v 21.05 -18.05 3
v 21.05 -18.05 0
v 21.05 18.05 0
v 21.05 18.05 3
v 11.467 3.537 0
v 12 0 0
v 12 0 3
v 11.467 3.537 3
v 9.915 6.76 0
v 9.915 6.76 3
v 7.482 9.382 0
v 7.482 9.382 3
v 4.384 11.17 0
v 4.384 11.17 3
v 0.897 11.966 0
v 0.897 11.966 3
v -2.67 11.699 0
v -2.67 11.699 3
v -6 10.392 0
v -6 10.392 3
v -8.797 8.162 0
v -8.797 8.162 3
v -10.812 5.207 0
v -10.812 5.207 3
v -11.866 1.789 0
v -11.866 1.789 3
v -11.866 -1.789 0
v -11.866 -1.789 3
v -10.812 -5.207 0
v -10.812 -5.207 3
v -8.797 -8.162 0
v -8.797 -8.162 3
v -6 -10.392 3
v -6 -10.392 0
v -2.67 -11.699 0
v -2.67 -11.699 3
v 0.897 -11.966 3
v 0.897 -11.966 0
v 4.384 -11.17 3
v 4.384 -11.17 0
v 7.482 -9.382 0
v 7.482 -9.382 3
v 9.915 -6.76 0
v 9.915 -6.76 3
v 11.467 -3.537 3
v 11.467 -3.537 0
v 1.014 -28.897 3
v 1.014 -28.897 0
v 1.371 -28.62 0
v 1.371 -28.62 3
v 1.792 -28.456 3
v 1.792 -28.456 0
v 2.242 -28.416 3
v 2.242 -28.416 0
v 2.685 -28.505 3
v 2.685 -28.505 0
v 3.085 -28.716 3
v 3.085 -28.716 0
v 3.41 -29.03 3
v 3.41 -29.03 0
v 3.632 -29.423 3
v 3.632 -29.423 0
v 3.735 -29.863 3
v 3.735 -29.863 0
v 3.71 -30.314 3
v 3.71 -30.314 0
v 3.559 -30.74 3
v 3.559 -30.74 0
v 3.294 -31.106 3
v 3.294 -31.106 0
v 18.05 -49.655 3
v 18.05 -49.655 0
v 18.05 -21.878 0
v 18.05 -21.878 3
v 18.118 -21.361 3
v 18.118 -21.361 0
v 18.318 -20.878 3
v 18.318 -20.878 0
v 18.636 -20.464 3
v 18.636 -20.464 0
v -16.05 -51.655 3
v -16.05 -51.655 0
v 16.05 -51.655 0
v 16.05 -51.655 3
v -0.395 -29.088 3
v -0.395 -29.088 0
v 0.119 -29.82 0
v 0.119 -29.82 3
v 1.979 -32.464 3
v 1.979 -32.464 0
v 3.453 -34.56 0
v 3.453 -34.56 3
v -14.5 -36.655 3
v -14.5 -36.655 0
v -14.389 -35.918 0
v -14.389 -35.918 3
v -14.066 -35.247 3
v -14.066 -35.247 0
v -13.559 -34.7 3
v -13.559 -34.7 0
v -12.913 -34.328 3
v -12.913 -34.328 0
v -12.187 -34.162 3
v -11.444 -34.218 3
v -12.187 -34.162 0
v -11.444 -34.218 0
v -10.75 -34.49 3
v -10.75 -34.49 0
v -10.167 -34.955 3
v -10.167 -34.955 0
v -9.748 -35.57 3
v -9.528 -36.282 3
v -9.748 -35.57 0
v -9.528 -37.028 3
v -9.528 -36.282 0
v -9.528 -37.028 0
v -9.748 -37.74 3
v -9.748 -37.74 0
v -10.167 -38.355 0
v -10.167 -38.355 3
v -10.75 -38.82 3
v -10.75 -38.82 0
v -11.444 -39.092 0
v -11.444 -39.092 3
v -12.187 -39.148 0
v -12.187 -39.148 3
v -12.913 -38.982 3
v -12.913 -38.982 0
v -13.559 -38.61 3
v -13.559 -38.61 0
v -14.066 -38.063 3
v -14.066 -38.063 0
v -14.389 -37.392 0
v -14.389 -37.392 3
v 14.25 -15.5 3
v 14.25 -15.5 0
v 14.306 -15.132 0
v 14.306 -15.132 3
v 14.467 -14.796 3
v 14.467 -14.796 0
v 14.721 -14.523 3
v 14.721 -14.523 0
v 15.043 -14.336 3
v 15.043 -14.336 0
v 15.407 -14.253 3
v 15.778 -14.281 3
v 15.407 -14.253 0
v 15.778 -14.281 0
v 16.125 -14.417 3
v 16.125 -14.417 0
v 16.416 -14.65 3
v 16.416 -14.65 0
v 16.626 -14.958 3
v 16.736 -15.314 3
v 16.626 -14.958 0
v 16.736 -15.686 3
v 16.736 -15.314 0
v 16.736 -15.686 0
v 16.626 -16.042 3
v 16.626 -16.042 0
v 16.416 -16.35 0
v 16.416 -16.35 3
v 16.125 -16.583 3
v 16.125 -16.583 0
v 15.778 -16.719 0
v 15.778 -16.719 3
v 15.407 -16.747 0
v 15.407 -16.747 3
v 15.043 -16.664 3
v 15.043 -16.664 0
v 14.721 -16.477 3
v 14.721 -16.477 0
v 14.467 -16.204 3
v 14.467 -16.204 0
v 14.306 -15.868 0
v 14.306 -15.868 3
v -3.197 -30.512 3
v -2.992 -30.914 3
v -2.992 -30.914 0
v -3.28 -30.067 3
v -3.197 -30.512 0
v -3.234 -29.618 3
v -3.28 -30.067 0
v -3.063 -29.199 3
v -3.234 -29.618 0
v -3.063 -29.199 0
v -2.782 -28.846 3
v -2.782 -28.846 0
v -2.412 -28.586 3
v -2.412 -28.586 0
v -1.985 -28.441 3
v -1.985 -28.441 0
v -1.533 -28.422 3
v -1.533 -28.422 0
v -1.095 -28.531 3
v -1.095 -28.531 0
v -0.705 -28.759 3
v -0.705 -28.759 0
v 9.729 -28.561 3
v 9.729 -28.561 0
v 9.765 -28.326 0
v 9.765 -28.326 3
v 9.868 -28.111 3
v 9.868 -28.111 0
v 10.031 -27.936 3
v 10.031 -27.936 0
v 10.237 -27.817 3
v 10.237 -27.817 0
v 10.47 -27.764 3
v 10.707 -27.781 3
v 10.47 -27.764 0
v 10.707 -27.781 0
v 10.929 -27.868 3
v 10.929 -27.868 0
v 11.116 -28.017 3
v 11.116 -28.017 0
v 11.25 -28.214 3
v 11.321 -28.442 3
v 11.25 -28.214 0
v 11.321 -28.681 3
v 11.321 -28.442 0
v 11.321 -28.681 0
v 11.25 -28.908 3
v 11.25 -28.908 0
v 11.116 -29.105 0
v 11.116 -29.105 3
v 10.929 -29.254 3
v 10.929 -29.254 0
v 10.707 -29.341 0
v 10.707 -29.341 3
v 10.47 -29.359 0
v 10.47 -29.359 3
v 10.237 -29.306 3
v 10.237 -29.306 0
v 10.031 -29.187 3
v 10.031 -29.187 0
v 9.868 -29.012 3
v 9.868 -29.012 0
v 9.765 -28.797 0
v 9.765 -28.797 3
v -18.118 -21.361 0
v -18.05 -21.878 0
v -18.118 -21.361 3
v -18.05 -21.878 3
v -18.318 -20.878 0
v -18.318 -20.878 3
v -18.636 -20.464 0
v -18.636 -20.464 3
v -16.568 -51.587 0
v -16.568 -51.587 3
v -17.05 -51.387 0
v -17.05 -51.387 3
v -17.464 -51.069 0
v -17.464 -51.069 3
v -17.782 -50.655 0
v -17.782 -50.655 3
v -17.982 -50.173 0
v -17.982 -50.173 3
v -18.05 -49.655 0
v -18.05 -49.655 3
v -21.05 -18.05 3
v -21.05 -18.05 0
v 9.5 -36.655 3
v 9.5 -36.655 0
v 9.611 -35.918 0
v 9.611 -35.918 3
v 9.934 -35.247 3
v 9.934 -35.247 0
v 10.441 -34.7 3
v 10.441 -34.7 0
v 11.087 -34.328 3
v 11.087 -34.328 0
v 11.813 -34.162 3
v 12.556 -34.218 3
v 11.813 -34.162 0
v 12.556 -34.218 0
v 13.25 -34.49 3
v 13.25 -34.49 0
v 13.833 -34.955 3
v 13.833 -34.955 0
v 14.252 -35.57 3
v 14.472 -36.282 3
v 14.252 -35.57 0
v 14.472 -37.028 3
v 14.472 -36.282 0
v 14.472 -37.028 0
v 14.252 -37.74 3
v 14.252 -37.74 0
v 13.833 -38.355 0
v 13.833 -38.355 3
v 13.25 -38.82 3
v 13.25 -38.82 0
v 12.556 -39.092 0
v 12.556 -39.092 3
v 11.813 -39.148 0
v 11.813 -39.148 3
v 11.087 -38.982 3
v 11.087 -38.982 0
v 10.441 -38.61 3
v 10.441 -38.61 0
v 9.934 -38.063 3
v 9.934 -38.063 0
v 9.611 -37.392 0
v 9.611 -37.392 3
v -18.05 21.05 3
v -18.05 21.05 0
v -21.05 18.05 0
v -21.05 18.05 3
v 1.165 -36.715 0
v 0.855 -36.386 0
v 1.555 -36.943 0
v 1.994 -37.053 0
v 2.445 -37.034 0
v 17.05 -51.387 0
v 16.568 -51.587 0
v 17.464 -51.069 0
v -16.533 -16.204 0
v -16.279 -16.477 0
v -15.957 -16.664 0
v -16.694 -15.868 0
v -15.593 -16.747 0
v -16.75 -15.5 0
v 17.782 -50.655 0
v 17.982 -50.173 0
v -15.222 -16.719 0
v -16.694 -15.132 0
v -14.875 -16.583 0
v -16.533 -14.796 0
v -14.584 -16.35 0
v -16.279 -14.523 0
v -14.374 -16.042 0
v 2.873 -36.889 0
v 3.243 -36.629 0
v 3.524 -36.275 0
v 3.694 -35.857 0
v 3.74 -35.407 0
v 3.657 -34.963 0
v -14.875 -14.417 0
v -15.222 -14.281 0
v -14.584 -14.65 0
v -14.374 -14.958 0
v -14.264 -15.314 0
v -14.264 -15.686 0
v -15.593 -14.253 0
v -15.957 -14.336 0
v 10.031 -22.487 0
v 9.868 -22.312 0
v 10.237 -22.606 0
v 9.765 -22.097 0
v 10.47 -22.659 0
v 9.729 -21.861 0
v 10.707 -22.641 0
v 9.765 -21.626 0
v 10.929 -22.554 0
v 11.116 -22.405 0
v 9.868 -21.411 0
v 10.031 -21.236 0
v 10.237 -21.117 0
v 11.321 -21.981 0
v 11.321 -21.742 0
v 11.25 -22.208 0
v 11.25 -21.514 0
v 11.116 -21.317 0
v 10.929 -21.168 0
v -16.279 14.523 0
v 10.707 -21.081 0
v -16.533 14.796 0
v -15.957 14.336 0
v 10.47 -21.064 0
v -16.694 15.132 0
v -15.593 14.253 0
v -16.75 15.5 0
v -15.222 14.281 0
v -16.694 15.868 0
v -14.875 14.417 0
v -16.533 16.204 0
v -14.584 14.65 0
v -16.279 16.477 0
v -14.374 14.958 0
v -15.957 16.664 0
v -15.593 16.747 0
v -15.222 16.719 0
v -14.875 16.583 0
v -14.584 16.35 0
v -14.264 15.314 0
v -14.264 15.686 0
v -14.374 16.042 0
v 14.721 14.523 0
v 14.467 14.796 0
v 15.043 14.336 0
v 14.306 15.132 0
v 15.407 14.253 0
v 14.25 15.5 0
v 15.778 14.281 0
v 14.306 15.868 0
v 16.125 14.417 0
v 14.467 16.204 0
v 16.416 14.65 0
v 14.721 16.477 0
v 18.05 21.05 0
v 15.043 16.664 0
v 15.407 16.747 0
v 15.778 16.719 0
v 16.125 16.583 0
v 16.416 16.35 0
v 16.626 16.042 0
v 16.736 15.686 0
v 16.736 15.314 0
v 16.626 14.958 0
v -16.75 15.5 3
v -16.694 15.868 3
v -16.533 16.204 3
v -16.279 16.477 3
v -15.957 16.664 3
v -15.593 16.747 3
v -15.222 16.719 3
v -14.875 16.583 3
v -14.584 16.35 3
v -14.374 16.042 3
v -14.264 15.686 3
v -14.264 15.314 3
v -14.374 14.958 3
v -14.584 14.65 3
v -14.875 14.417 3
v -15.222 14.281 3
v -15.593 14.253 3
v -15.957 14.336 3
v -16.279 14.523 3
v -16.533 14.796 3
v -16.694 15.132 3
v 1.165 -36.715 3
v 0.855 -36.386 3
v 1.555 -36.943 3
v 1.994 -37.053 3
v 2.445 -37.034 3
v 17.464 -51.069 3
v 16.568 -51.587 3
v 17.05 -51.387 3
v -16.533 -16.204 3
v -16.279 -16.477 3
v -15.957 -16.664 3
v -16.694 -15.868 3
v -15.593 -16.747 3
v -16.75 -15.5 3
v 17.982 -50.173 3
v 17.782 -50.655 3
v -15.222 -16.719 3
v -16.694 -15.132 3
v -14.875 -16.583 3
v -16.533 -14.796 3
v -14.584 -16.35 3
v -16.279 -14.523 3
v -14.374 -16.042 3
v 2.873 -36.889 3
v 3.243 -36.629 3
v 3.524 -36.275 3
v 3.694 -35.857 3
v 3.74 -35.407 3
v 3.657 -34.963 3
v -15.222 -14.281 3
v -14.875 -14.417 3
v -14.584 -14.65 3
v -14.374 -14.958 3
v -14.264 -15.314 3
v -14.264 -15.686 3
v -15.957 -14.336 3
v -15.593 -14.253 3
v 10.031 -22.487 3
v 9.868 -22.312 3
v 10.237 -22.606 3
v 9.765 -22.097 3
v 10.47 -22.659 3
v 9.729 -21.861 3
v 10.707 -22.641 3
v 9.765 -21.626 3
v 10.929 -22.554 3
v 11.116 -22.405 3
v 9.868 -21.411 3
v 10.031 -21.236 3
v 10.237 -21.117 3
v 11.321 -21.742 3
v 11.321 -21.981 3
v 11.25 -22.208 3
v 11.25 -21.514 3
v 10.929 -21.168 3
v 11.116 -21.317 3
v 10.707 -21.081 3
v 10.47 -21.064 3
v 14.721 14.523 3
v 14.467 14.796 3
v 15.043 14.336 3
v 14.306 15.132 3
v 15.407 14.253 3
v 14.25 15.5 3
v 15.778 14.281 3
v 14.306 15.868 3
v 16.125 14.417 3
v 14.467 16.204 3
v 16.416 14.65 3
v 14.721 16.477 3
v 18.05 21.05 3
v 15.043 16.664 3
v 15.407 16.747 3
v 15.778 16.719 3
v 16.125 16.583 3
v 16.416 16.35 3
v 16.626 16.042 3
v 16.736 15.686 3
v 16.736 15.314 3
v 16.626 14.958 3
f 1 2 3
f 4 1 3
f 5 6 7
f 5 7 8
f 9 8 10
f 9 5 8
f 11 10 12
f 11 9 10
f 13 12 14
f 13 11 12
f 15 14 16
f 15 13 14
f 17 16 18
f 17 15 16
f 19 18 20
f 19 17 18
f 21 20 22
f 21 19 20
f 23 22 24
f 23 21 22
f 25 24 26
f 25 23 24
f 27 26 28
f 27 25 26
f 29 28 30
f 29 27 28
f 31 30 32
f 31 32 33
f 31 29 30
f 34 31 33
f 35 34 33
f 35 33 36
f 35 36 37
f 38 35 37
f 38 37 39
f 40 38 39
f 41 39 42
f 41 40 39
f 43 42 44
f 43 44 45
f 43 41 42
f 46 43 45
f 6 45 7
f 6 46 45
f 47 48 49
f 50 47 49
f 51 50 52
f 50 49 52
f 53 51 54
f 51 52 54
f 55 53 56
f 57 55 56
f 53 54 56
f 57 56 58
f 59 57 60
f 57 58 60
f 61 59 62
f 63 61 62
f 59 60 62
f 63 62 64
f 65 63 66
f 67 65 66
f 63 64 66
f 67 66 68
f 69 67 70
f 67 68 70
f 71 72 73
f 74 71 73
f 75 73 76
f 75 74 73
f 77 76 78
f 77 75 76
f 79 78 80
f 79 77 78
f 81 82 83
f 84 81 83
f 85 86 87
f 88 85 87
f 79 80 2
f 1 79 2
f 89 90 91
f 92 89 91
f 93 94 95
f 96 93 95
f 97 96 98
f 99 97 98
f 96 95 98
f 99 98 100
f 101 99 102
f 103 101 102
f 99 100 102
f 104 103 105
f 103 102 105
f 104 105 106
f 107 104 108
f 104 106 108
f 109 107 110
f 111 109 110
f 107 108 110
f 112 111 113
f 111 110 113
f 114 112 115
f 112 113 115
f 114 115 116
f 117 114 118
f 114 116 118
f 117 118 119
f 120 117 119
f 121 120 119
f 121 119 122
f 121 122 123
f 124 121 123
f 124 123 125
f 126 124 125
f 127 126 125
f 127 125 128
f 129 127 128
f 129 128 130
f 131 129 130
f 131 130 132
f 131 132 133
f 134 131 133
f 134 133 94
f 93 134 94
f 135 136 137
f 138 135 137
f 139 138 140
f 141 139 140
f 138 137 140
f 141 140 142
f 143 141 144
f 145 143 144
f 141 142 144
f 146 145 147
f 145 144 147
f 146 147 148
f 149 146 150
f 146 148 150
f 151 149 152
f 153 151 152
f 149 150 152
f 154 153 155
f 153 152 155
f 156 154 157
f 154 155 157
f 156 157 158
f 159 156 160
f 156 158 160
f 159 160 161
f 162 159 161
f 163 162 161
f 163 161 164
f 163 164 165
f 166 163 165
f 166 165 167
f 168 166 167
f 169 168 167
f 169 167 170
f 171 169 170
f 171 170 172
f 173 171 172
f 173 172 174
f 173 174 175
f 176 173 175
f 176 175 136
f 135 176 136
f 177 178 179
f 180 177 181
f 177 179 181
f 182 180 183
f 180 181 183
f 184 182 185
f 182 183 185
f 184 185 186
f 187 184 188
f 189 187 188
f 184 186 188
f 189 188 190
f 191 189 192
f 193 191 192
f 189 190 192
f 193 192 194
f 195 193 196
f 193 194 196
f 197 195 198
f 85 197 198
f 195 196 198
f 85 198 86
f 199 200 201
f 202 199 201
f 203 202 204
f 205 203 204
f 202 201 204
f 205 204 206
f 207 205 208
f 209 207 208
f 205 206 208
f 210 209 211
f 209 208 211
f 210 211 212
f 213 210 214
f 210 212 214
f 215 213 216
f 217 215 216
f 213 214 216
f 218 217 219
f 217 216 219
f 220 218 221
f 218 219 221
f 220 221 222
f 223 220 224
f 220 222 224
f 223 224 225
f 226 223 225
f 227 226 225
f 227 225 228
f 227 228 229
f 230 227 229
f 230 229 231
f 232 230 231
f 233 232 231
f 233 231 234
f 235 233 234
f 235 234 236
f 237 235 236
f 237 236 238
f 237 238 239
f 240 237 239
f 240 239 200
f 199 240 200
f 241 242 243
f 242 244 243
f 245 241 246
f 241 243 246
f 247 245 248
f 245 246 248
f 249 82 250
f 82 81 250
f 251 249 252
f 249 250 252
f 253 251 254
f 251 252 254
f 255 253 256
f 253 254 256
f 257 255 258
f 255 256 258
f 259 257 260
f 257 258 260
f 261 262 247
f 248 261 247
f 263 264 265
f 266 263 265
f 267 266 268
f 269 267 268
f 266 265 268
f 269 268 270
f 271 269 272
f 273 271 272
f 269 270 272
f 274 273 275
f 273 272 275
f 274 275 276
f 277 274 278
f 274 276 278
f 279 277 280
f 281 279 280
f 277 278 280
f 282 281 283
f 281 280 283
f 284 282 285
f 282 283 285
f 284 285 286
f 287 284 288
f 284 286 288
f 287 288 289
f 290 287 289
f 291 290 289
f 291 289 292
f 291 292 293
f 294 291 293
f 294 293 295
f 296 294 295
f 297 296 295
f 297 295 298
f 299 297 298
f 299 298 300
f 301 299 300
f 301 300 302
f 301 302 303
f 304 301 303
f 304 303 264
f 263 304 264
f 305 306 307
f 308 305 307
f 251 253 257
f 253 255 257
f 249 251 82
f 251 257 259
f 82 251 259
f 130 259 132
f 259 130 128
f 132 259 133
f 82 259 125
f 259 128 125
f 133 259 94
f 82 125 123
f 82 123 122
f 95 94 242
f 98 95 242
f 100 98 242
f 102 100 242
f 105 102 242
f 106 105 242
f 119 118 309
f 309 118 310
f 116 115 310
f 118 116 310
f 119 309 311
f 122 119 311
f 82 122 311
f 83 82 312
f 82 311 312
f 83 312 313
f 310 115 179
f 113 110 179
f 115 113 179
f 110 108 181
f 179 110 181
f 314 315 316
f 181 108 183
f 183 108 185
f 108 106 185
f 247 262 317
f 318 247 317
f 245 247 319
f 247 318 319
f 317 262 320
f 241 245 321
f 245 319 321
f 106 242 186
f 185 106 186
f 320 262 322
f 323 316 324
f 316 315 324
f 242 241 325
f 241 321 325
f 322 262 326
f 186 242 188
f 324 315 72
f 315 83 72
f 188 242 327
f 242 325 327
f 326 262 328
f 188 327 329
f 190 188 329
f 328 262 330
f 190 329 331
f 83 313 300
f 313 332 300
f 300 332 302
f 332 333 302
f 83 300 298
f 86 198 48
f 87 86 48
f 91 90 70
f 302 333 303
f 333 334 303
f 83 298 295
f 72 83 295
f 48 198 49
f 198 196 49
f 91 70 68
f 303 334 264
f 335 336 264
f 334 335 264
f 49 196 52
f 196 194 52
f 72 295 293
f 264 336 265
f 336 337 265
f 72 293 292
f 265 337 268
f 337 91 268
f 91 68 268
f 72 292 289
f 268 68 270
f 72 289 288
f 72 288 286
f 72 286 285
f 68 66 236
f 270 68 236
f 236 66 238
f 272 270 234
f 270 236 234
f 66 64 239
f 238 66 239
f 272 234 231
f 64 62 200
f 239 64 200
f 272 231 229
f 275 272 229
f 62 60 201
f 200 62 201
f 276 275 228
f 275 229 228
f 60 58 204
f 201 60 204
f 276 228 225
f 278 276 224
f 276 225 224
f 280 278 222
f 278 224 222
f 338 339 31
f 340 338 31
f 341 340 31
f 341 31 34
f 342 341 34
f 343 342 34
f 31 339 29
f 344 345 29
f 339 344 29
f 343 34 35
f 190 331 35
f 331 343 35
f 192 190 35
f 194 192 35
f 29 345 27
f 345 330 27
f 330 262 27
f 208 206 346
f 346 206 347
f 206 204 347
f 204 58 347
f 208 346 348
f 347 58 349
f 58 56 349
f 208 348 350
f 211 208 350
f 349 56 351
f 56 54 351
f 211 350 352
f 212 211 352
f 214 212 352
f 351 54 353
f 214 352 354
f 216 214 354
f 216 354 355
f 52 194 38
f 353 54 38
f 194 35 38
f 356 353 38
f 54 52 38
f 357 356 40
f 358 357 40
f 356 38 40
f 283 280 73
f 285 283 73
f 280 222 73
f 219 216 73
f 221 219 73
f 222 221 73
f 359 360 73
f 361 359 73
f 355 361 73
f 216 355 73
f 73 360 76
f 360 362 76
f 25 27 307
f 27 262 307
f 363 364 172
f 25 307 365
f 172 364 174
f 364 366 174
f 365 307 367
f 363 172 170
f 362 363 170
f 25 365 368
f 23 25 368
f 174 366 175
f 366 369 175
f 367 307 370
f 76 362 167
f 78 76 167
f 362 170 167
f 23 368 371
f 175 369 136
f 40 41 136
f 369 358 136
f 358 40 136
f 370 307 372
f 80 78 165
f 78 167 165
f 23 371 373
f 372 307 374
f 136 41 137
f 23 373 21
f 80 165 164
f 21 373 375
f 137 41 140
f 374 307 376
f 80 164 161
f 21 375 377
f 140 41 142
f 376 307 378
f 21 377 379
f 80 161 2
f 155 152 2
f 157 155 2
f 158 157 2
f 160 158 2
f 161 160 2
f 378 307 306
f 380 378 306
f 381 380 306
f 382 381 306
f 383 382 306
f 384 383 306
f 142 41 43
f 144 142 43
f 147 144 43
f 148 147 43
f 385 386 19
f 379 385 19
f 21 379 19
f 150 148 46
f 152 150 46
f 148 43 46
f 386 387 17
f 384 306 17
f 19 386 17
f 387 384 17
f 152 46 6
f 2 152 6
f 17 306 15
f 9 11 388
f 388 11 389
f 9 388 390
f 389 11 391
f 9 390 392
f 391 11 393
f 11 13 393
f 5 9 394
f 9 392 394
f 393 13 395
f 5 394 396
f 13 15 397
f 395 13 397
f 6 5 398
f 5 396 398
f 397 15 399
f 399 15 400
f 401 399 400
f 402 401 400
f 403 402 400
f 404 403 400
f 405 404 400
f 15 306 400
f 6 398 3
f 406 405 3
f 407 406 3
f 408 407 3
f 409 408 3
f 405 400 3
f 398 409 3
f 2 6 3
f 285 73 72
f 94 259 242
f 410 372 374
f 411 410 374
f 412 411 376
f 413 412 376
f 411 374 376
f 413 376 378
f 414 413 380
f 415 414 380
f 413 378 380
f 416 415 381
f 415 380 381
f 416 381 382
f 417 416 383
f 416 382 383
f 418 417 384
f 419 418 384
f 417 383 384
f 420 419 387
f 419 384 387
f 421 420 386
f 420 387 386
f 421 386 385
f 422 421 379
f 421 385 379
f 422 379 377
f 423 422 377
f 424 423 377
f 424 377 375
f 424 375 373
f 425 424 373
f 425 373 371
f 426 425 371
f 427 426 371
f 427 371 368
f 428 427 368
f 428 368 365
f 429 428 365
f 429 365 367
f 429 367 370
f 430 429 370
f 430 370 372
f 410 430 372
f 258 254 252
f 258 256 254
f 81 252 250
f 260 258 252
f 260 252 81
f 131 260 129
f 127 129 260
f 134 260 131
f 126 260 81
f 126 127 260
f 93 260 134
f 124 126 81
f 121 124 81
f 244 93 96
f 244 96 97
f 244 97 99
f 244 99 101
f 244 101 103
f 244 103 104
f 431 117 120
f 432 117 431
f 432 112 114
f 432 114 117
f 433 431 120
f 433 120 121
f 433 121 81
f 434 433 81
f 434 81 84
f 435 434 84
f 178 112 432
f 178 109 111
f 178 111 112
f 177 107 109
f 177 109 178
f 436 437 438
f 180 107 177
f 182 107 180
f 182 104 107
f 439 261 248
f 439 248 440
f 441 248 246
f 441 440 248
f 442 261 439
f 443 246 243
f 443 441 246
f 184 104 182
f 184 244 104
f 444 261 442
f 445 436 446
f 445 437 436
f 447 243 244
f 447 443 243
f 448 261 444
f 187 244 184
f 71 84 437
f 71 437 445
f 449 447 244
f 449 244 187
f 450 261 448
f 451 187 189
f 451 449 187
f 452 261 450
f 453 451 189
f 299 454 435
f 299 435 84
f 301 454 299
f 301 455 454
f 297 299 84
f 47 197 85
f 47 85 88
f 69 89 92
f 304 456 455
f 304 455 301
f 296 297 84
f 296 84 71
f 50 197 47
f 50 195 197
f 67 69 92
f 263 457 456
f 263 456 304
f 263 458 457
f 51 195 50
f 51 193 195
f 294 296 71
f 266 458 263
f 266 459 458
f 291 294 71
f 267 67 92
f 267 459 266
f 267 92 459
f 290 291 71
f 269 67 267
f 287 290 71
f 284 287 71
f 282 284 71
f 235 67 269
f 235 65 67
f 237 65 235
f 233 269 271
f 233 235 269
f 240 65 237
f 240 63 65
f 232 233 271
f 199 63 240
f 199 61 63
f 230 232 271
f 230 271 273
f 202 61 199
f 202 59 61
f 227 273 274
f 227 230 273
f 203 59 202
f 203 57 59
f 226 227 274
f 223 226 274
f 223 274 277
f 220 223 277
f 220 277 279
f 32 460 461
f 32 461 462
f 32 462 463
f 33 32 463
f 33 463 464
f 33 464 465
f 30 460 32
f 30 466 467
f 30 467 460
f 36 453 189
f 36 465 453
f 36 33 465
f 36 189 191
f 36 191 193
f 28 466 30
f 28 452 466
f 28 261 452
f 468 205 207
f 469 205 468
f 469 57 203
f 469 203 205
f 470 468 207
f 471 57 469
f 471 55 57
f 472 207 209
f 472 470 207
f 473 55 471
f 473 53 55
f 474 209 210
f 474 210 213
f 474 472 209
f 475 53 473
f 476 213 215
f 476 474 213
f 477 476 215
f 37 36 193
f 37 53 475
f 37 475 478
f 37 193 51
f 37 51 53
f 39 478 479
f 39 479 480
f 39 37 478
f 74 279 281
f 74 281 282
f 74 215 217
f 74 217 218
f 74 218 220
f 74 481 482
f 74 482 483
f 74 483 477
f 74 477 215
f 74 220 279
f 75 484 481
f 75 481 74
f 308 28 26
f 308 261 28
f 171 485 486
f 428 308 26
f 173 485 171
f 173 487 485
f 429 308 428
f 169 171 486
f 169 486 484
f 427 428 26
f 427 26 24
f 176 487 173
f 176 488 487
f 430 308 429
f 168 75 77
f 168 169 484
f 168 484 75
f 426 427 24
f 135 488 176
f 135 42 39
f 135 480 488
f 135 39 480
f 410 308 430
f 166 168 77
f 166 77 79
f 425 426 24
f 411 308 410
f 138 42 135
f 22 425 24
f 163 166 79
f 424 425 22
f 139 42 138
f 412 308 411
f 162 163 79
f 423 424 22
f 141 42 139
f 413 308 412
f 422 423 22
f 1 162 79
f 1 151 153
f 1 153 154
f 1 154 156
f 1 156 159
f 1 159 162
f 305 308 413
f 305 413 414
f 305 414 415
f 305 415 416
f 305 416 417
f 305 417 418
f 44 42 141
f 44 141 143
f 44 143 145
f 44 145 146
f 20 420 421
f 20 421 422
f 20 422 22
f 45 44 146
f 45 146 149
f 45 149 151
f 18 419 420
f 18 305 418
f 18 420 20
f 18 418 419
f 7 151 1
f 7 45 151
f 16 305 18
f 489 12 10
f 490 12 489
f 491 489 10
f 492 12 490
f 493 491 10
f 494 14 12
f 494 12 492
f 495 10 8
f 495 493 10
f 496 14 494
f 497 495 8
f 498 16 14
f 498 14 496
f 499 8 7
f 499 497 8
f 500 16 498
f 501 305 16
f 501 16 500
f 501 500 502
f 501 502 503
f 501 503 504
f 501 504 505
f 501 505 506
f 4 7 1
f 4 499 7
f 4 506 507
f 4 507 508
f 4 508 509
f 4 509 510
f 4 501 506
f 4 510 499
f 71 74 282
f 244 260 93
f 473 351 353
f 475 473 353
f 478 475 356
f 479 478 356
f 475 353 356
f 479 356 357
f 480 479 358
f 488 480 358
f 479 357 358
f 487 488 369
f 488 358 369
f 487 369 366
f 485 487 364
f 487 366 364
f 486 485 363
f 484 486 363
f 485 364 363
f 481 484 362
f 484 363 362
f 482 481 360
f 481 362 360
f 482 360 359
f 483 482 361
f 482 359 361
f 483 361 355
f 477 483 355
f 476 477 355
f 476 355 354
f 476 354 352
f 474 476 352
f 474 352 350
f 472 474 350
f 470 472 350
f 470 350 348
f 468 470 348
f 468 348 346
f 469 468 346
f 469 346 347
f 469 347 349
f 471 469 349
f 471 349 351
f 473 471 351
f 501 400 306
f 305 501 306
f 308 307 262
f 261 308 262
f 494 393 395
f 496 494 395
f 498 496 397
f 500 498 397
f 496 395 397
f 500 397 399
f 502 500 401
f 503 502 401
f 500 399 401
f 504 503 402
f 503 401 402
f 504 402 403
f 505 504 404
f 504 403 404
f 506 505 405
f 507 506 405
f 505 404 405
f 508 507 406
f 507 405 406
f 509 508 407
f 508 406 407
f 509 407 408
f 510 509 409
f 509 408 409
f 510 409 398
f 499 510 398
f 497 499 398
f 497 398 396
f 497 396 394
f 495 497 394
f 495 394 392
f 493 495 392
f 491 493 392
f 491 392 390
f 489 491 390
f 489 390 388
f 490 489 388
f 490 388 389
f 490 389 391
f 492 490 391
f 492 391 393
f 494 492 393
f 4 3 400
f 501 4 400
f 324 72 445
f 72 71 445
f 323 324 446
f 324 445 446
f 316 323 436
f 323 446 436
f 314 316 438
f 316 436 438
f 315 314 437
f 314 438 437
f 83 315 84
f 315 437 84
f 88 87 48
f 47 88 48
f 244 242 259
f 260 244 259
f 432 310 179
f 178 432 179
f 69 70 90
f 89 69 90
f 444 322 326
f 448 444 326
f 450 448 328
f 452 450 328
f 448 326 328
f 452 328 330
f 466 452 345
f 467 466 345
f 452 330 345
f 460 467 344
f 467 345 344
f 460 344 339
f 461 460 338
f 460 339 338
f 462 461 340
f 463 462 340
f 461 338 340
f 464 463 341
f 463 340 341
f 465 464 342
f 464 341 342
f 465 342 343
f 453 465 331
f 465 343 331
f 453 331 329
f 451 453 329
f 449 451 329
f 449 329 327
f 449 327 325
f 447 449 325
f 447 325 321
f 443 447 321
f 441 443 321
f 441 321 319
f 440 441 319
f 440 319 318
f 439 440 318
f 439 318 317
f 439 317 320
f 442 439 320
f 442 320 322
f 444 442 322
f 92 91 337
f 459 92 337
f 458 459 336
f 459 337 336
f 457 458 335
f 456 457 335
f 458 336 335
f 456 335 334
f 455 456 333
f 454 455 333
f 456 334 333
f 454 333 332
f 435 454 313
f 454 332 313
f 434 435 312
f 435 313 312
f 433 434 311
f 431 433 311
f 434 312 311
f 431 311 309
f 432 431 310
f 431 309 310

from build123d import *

# Parameters (mm, degrees)
SKETCH1_R                   = 12
BOSS_EXTRUDE1_DEPTH         = 3
TAP_DRILL_FOR_M3_TAP1_D     = 2.5
TAP_DRILL_FOR_M3_TAP1_DEPTH = 5
TAP_DRILL_FOR_M3_TAP1_TIP   = 0.751075774
TAP_DRILL_FOR_M6_TAP1_D     = 5
TAP_DRILL_FOR_M6_TAP1_DEPTH = 5
TAP_DRILL_FOR_M6_TAP1_TIP   = 1.502151548
FILLET1_R                   = 2
TAP_DRILL_FOR_M2_TAP1_D     = 1.6
TAP_DRILL_FOR_M2_TAP1_DEPTH = 5
TAP_DRILL_FOR_M2_TAP1_TIP   = 0.480688495
CUT_EXTRUDE1_DEPTH          = 10


with BuildPart() as part:
    # Sketch1 → Boss-Extrude1 (new body)
    with BuildSketch(Plane.XY):
        Polygon((18.05, -51.655), (18.05, -21.05), (21.05, -18.05), (21.05, 18.05), (18.05, 21.05), (-18.05, 21.05), (-21.05, 18.05), (-21.05, -18.05), (-18.05, -21.05), (-18.05, -51.655), align=None)
        Circle(SKETCH1_R, mode=Mode.SUBTRACT)
    extrude(amount=BOSS_EXTRUDE1_DEPTH)

    # Tap Drill for M3 Tap1
    with Locations(Plane.XY.offset(3)):
        with Locations((-15.5, 15.5), (15.5, 15.5), (-15.5, -15.5), (15.5, -15.5)):
            Hole(TAP_DRILL_FOR_M3_TAP1_D / 2, depth=TAP_DRILL_FOR_M3_TAP1_DEPTH)
            with Locations((0, 0, -(TAP_DRILL_FOR_M3_TAP1_DEPTH + TAP_DRILL_FOR_M3_TAP1_TIP / 2))):  # 118° drill point
                Cone(0, TAP_DRILL_FOR_M3_TAP1_D / 2, TAP_DRILL_FOR_M3_TAP1_TIP, mode=Mode.SUBTRACT)

    # Tap Drill for M6 Tap1
    with Locations(Plane.XY.offset(3)):
        with Locations((-12, -36.655), (12, -36.655)):
            Hole(TAP_DRILL_FOR_M6_TAP1_D / 2, depth=TAP_DRILL_FOR_M6_TAP1_DEPTH)
            with Locations((0, 0, -(TAP_DRILL_FOR_M6_TAP1_DEPTH + TAP_DRILL_FOR_M6_TAP1_TIP / 2))):  # 118° drill point
                Cone(0, TAP_DRILL_FOR_M6_TAP1_D / 2, TAP_DRILL_FOR_M6_TAP1_TIP, mode=Mode.SUBTRACT)

    # Fillet1
    fillet1_edges = [part.edges().sort_by_distance(p)[0] for p in [
        (18.05, -21.05, 1.5),
        (18.05, -51.655, 1.5),
        (-18.05, -51.655, 1.5),
        (-18.05, -21.05, 1.5),
    ]]
    fillet(fillet1_edges, radius=FILLET1_R)

    # Tap Drill for M2 Tap1
    with Locations(Plane.XY.offset(3)):
        with Locations((10.52945603, -21.86131015), (10.52945603, -28.56131015)):
            Hole(TAP_DRILL_FOR_M2_TAP1_D / 2, depth=TAP_DRILL_FOR_M2_TAP1_DEPTH)
            with Locations((0, 0, -(TAP_DRILL_FOR_M2_TAP1_DEPTH + TAP_DRILL_FOR_M2_TAP1_TIP / 2))):  # 118° drill point
                Cone(0, TAP_DRILL_FOR_M2_TAP1_D / 2, TAP_DRILL_FOR_M2_TAP1_TIP, mode=Mode.SUBTRACT)

    # Sketch8 → Cut-Extrude1 (cut)
    with BuildSketch(Plane(origin=(0, 0, 0), x_dir=(-1, 0, 0), z_dir=(0, 0, -1))):
        with BuildLine():
            Line((-0.855282685, -36.386266358), (2.992061815, -30.914487513))
            ThreePointArc((2.992061815, -30.914487513), (2.60653362, -28.702773131), (0.394819237, -29.088301326))
            Line((0.394819237, -29.088301326), (-0.119454204, -29.819712442))
            Line((-0.119454204, -29.819712442), (-1.013815468, -28.896697877))
            ThreePointArc((-1.013815468, -28.896697877), (-3.258600516, -28.861305914), (-3.293992479, -31.106090962))
            Line((-3.293992479, -31.106090962), (-1.978516355, -32.463711947))
            Line((-1.978516355, -32.463711947), (-3.452525263, -34.56008017))
            ThreePointArc((-3.452525263, -34.56008017), (-3.066997067, -36.771794553), (-0.855282685, -36.386266358))
        make_face()
    extrude(amount=-CUT_EXTRUDE1_DEPTH, mode=Mode.SUBTRACT)


solid = part.part
